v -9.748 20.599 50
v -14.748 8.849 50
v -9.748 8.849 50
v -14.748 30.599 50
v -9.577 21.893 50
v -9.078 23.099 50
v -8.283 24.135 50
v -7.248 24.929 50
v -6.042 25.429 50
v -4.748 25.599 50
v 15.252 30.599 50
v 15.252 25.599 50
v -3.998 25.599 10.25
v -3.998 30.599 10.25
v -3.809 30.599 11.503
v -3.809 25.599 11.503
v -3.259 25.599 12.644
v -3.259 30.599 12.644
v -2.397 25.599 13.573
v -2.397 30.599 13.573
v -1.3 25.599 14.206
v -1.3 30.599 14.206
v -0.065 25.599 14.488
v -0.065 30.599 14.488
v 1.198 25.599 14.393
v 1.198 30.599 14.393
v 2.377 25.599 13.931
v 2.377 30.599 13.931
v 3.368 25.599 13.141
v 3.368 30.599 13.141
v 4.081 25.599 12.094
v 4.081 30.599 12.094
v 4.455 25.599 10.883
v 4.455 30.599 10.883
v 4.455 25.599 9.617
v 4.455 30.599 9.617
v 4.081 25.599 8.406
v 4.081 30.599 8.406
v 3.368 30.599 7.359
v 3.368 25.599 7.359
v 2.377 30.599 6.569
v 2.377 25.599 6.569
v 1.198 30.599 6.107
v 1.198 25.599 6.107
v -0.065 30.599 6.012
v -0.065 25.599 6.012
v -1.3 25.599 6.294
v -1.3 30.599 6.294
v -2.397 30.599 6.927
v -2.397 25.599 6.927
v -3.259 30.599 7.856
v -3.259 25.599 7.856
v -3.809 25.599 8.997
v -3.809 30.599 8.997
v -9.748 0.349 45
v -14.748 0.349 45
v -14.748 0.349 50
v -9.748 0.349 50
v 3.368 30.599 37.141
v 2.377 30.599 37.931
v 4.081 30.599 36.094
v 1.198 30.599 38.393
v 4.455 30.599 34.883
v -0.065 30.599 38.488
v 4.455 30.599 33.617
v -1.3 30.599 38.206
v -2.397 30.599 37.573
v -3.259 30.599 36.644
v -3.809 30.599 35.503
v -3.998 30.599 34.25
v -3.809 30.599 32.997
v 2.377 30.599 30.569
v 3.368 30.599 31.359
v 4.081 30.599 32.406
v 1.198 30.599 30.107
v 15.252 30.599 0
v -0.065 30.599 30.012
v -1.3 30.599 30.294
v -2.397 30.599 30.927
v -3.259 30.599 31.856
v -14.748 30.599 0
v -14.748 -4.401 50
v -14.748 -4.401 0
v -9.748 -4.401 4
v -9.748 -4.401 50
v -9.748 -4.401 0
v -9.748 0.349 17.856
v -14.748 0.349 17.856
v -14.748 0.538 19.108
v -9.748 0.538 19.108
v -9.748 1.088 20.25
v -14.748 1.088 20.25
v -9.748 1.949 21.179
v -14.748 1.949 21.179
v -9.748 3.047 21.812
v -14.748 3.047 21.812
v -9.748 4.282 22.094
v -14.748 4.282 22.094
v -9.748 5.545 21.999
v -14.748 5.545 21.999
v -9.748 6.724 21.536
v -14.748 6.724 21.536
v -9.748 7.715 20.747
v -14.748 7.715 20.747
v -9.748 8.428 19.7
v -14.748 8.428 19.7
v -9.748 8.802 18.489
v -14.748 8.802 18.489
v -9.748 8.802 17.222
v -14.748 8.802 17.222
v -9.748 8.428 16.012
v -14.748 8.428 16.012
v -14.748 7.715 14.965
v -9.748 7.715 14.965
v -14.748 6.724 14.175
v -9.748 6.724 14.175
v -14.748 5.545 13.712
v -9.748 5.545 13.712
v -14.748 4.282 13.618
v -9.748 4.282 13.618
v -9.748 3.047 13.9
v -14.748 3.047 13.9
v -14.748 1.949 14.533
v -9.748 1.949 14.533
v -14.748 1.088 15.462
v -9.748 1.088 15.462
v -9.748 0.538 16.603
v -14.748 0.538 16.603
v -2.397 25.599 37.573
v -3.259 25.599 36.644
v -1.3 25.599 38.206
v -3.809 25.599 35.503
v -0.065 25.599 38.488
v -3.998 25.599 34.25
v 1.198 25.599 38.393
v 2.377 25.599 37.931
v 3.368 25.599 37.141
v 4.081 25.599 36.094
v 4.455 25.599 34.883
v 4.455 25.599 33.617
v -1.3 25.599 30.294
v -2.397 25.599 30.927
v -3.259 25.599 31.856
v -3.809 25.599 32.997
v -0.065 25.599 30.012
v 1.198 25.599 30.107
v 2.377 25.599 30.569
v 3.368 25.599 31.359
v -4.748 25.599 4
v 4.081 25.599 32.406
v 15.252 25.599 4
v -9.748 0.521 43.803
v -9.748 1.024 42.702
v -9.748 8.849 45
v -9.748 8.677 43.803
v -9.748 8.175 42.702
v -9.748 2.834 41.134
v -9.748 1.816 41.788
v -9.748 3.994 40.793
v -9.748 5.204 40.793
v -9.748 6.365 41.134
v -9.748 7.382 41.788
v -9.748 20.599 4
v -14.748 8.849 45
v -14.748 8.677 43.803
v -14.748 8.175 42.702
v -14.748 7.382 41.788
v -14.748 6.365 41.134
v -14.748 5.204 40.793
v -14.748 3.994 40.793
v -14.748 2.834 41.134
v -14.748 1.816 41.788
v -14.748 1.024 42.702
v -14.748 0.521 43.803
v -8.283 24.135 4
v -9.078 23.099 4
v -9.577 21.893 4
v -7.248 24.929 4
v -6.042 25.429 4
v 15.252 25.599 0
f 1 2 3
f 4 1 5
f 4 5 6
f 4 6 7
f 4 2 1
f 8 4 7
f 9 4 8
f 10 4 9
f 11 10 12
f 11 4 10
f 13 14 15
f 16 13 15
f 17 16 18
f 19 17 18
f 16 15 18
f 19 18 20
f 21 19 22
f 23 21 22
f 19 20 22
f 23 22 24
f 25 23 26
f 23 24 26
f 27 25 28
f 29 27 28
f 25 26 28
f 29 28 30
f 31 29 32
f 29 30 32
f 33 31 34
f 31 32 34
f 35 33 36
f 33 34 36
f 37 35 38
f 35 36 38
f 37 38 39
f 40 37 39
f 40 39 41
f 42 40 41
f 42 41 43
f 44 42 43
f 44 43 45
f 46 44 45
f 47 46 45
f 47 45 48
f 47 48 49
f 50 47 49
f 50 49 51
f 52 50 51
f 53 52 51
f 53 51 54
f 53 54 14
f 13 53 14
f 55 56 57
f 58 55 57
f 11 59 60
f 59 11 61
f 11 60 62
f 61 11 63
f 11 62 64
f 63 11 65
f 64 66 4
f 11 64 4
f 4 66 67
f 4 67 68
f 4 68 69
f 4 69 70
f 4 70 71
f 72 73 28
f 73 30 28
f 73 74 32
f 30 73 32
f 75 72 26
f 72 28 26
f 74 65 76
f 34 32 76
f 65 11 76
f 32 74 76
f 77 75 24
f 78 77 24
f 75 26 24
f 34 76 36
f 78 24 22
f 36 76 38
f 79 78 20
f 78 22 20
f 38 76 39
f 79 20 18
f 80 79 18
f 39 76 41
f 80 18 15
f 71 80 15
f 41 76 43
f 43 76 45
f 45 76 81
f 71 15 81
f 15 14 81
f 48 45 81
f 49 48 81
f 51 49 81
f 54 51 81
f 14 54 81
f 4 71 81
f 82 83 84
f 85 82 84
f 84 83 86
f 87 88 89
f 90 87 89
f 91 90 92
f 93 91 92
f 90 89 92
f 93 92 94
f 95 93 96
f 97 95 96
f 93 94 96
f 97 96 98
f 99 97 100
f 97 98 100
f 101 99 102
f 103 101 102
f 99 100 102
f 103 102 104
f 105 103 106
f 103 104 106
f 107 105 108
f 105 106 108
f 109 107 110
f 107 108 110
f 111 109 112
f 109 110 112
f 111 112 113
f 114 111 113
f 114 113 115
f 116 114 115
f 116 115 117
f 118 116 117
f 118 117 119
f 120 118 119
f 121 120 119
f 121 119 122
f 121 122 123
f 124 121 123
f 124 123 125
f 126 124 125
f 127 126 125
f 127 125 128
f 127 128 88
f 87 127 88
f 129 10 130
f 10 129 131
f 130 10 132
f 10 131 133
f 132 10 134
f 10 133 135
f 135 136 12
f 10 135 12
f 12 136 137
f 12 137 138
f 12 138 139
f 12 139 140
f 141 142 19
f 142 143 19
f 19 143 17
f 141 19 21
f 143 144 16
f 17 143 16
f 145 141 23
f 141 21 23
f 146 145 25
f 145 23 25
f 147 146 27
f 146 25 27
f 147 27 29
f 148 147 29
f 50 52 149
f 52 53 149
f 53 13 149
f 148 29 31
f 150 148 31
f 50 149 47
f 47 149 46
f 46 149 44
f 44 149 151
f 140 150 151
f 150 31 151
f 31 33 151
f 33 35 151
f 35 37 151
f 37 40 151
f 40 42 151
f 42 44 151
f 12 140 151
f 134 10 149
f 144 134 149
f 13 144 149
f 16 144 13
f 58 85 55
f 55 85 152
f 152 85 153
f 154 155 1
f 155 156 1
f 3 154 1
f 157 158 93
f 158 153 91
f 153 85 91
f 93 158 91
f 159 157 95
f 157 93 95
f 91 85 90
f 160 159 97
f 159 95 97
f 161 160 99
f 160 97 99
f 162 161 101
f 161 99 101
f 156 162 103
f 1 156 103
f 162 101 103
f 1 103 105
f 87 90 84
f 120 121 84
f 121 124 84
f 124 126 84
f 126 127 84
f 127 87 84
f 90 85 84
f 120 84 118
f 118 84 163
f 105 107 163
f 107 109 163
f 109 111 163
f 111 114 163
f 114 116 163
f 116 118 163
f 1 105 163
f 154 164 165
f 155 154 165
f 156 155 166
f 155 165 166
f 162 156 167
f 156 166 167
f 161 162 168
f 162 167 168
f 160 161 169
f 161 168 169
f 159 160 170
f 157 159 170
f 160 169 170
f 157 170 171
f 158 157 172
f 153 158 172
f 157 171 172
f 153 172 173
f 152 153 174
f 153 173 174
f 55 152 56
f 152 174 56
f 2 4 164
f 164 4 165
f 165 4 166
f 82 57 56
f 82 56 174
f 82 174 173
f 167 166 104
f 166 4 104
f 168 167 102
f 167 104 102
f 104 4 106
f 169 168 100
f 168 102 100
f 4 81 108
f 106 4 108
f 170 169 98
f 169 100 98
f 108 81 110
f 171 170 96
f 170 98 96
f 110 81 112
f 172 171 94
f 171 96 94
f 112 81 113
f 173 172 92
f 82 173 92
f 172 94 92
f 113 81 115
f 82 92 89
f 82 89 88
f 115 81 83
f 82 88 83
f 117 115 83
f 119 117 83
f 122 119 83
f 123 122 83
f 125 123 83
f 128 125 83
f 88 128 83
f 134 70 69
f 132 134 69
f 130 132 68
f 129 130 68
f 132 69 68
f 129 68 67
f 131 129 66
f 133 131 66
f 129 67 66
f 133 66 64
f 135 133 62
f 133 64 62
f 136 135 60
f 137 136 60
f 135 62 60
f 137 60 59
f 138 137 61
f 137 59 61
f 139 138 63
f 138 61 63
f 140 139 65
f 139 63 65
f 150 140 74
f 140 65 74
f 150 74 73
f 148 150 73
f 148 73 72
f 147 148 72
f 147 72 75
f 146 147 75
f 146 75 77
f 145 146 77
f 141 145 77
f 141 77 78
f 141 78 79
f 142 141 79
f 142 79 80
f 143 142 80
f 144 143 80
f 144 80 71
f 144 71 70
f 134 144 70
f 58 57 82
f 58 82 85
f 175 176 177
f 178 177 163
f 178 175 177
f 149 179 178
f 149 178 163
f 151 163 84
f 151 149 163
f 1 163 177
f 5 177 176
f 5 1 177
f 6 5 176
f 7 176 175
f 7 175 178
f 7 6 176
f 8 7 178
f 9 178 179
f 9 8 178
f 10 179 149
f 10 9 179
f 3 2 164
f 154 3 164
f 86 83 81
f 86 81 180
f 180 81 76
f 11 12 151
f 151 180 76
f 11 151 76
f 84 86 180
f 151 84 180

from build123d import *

# Parameters (mm, degrees)
F1_DEPTH = 50
F2_DEPTH = 4
F3_R     = 4.25
F4_DEPTH = 25
F5_R     = 4.25
F6_DEPTH = 25
F7_R     = 5


with BuildPart() as f1:
    # F0 (on Top) → F1 (new body)
    with BuildSketch(Plane.XY):
        Polygon((-14.747666, -4.400732), (-9.747666, -4.400732), (-9.747666, 25.599268), (15.252334, 25.599268), (15.252334, 30.599268), (-14.747666, 30.599268), align=None)
    extrude(amount=F1_DEPTH)

    # F0 (on Top) → F2 (join)
    with BuildSketch(Plane.XY):
        Polygon((-9.747666, 25.599268), (-9.747666, -4.400732), (15.252334, 25.599268), align=None)
    extrude(amount=F2_DEPTH)

    # F3 (on face) → F4 (cut)
    with BuildSketch(Plane(origin=(-14.747666, 0, 0), x_dir=(0, -1, 0), z_dir=(-1, 0, 0))):
        with Locations((-4.599268, 17.855786)):
            Circle(F3_R)
        with BuildLine():
            ThreePointArc((-0.349268, 45), (-4.599268, 49.25), (-8.849268, 45))
            ThreePointArc((-8.849268, 45), (-4.599268, 40.75), (-0.349268, 45))
        make_face()
        with BuildLine():
            Line((-0.349268, 50), (-8.849268, 50))
            Line((-8.849268, 50), (-8.849268, 45))
            ThreePointArc((-8.849268, 45), (-4.599268, 49.25), (-0.349268, 45))
            Line((-0.349268, 45), (-0.349268, 50))
        make_face()
    extrude(amount=-F4_DEPTH, mode=Mode.SUBTRACT)

    # F5 (on face) → F6 (cut)
    with BuildSketch(Plane(origin=(0, 30.599268, 0), x_dir=(-1, 0, 0), z_dir=(0, 1, 0))):
        with Locations((-0.252334, 34.25)):
            Circle(F5_R)
        with Locations((-0.252334, 10.25)):
            Circle(F5_R)
    extrude(amount=-F6_DEPTH, mode=Mode.SUBTRACT)

    # F7
    f7_edges = [f1.edges().sort_by_distance(p)[0] for p in [
        (-9.747666, 25.599268, 27),
    ]]
    fillet(f7_edges, radius=F7_R)


solid = f1.part
